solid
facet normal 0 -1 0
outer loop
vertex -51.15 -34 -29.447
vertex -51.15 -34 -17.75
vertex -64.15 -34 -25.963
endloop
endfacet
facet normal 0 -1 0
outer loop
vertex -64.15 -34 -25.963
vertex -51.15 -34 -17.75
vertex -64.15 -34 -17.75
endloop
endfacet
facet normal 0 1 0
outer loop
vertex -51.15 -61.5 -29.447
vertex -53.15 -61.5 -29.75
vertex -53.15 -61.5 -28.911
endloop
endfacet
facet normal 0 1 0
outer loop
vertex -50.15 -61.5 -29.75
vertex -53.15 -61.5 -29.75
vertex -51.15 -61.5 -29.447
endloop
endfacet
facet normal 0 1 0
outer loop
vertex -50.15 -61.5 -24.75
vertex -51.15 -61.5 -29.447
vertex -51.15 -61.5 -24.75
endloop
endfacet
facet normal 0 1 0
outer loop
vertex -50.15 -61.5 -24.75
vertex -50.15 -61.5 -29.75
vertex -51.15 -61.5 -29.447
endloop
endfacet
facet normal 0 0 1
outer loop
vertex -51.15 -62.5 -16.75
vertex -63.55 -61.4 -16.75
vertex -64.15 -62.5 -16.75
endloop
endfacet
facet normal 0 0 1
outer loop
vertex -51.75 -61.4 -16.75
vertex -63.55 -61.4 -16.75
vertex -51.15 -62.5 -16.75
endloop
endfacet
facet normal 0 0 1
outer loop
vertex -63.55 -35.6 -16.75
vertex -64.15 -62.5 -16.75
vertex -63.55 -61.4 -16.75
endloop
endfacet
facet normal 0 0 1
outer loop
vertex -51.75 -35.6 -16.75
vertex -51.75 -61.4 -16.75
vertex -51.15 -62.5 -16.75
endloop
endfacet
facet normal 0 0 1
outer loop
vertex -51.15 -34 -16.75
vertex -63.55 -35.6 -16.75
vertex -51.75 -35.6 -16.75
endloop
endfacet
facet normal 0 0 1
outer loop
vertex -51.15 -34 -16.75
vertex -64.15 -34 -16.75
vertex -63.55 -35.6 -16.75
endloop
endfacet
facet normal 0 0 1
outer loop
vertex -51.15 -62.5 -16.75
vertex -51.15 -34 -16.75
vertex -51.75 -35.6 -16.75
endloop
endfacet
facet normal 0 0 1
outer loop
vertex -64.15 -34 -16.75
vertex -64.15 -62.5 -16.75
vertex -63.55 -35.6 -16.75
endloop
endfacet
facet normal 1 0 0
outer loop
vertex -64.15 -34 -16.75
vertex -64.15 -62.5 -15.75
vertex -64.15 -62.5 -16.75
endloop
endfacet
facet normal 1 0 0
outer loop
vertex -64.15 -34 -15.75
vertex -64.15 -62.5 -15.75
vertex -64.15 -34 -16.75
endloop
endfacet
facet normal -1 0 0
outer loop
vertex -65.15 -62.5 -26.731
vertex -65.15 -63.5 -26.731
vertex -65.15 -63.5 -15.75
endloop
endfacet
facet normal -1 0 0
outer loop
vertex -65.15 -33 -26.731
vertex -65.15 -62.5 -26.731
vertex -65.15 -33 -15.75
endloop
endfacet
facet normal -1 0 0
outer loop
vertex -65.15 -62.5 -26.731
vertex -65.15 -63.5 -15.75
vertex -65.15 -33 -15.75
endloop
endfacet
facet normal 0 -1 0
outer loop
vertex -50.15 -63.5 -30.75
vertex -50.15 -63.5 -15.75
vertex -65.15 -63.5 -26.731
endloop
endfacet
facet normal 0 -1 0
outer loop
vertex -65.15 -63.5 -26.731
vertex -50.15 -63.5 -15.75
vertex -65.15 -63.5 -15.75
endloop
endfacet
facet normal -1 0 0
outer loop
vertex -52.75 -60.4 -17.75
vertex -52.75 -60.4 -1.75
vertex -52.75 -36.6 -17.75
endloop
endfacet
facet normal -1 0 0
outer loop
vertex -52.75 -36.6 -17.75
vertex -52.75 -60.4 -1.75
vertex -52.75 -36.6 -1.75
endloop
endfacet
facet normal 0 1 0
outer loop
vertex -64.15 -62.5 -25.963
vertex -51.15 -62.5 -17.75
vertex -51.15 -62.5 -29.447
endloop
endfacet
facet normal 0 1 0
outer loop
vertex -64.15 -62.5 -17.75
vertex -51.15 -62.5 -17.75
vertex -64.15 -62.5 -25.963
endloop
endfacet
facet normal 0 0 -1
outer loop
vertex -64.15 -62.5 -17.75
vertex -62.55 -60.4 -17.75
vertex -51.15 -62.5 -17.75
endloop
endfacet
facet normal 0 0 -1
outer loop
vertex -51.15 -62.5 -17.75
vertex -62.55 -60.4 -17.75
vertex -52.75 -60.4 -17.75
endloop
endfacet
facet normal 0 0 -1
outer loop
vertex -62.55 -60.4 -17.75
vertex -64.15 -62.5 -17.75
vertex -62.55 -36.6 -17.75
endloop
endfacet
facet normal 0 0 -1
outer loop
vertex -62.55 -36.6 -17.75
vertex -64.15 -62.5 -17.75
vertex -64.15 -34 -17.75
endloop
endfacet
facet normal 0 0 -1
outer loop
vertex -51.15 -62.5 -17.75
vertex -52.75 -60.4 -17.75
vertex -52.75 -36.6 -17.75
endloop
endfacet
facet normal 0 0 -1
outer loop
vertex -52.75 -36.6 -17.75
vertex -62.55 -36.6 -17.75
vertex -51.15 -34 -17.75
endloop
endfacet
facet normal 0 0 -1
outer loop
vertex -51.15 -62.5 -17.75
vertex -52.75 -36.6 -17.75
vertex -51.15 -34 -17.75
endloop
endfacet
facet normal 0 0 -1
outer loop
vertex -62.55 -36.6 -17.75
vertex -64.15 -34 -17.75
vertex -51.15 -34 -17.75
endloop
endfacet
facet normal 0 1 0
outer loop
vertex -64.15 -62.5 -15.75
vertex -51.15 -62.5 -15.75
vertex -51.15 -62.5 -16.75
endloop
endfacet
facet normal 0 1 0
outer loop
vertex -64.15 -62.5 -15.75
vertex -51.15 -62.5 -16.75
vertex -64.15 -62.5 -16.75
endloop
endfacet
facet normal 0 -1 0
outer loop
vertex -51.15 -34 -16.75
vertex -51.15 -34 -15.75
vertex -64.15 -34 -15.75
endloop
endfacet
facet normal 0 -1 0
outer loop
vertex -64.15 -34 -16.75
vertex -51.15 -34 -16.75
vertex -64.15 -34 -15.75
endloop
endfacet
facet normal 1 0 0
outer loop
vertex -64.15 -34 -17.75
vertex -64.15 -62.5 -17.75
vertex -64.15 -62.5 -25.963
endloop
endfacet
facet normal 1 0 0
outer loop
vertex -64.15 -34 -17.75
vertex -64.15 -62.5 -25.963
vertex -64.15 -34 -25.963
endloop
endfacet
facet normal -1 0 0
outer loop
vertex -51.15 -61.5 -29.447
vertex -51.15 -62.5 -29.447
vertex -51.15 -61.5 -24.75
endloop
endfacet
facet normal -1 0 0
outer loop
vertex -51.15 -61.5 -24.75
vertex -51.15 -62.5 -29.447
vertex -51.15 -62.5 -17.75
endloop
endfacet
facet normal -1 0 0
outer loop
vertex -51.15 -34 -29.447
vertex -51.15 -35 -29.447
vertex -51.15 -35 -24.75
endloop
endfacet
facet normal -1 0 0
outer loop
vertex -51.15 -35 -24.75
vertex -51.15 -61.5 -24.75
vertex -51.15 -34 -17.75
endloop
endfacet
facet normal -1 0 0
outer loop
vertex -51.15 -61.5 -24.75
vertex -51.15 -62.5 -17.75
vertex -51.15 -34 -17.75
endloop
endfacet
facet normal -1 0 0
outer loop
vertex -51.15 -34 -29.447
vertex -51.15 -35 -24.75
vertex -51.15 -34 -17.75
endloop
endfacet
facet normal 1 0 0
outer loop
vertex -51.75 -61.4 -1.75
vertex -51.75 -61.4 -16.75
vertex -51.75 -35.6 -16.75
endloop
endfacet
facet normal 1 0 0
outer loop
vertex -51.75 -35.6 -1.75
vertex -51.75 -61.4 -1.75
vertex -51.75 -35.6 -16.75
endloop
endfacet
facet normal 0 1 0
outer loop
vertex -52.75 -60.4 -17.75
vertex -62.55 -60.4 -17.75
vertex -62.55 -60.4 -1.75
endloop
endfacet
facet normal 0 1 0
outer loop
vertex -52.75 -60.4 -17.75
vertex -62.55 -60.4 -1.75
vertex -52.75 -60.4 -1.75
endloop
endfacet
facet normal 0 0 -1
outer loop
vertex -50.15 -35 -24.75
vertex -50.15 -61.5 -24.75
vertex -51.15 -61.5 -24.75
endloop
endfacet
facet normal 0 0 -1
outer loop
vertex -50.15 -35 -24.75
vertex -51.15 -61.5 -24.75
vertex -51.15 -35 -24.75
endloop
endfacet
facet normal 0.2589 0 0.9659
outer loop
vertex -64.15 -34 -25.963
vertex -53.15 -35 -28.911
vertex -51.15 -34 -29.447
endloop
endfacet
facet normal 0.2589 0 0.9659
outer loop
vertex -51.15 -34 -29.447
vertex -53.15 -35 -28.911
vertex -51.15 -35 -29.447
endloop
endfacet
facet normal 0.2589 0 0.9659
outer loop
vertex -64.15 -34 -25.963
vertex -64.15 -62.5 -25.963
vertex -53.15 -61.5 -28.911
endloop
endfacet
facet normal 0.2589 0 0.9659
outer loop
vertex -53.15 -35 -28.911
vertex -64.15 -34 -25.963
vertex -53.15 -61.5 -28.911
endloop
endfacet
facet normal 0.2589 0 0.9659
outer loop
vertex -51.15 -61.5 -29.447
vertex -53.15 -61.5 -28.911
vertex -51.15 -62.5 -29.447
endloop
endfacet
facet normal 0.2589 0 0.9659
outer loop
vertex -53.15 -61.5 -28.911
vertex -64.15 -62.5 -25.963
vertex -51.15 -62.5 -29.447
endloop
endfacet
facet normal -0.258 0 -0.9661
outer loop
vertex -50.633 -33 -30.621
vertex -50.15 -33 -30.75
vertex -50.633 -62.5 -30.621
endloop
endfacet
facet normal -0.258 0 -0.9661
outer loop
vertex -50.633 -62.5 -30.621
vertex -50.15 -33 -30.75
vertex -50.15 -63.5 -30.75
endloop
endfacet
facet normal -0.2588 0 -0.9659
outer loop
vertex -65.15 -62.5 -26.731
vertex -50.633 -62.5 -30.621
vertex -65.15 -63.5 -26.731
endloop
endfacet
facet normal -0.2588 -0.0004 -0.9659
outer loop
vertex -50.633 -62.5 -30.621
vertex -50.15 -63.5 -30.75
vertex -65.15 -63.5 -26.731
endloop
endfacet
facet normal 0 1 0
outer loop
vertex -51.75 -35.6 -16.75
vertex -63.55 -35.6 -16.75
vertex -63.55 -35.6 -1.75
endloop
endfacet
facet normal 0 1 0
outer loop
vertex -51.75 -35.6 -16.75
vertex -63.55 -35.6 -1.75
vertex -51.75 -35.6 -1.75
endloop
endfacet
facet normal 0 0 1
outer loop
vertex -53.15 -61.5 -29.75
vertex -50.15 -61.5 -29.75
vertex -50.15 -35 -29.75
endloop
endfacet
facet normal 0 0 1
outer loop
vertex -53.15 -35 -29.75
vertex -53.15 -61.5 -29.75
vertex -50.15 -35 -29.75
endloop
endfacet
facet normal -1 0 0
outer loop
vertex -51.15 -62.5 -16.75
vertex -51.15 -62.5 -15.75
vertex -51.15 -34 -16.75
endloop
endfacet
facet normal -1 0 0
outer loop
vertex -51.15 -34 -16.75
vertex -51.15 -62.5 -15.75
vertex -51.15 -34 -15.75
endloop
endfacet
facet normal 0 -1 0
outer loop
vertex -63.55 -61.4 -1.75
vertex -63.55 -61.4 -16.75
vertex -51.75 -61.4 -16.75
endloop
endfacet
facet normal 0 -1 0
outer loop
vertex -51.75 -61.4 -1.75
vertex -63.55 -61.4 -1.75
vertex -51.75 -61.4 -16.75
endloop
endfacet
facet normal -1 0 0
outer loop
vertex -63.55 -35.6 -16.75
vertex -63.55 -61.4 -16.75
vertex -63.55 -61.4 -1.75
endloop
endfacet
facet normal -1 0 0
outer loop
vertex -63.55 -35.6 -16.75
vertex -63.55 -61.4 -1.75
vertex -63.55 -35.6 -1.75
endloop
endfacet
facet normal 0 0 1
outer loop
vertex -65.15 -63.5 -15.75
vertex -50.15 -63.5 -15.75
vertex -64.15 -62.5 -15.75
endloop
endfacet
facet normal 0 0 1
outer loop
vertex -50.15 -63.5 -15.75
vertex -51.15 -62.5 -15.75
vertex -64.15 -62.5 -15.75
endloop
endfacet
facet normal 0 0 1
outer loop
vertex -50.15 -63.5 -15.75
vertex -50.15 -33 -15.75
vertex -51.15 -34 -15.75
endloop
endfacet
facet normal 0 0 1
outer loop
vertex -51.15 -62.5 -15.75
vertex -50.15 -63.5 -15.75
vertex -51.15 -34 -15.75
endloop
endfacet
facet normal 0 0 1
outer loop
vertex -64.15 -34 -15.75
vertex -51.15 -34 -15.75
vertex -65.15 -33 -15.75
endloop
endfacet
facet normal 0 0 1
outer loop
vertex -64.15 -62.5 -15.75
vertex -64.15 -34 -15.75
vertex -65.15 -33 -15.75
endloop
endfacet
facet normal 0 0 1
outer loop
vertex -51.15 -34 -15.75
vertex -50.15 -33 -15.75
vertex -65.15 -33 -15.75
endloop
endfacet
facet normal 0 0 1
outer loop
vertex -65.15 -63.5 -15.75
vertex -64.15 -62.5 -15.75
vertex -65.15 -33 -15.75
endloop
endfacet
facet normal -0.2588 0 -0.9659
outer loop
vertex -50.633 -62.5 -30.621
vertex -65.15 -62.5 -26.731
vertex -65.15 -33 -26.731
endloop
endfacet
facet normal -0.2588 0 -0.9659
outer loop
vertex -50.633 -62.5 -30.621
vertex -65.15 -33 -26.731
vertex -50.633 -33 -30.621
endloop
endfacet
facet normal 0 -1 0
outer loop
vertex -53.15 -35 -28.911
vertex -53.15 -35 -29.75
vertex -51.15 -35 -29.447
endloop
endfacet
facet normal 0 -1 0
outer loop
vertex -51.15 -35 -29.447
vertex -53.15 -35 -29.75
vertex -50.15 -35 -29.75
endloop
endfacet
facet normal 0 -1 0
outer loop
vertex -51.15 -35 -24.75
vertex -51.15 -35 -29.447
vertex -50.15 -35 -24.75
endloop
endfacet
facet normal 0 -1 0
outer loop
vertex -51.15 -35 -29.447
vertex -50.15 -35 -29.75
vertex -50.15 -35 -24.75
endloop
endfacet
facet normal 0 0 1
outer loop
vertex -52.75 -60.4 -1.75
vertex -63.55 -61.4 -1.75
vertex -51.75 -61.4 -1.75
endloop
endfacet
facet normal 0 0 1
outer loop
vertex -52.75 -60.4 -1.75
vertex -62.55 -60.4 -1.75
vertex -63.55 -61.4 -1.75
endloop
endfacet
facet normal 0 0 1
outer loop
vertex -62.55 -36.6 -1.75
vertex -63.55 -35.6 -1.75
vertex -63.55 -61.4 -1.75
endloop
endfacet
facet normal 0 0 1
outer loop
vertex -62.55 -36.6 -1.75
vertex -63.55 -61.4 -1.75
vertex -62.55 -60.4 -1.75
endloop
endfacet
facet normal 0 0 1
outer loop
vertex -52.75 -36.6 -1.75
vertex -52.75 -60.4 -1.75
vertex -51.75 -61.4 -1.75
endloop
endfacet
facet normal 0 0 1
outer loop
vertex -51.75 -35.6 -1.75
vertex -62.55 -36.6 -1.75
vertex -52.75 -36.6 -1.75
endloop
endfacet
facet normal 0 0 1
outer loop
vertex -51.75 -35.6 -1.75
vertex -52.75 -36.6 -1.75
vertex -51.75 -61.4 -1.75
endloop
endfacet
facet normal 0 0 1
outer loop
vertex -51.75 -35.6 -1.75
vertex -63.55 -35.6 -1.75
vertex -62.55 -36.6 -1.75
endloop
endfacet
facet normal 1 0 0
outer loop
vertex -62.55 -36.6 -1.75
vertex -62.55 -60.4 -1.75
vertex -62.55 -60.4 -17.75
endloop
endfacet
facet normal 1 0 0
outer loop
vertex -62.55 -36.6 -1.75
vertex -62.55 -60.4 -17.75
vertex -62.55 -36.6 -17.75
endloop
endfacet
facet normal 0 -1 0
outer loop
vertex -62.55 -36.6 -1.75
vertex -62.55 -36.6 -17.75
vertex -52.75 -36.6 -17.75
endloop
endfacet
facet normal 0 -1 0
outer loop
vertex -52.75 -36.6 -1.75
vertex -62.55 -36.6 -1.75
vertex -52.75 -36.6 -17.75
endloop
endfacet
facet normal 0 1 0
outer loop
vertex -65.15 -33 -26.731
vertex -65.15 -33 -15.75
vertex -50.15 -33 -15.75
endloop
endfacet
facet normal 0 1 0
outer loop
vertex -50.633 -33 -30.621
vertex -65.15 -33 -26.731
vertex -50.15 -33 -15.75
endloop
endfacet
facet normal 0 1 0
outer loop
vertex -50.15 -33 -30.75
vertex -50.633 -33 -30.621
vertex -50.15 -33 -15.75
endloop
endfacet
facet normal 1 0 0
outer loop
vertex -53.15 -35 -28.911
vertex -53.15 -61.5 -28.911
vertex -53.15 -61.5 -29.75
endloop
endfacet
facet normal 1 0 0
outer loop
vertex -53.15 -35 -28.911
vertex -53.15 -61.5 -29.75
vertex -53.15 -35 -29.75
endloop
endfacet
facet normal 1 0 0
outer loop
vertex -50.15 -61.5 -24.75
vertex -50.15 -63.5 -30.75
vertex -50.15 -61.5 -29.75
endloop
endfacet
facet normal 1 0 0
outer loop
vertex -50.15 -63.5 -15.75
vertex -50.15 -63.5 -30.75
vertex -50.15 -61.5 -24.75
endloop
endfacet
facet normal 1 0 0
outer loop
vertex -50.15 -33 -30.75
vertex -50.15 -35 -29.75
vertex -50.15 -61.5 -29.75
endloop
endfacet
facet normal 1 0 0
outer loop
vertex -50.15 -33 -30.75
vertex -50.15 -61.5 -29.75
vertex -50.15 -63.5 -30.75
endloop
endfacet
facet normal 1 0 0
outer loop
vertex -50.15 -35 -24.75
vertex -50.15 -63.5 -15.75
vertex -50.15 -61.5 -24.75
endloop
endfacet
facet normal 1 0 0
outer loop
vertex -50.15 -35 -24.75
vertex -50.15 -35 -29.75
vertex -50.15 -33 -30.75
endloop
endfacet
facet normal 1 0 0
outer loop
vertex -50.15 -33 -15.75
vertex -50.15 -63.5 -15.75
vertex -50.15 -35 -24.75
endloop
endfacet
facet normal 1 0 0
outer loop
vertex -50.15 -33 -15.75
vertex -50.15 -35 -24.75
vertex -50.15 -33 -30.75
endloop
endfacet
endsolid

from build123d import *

# Parameters (mm, degrees)
SKETCH061_W        = 11.8
SKETCH061_H        = 25.8
SKETCH061_W_2      = 9.8
SKETCH061_H_2      = 23.8
PAD031_DEPTH       = 15
SKETCH062_W        = 15
SKETCH062_H        = 30.5
SKETCH062_W_2      = 9.8
SKETCH062_H_2      = 23.8
PAD032_DEPTH       = 1
SKETCH063_W        = 15
SKETCH063_H        = 30.5
SKETCH063_W_2      = 13
SKETCH063_H_2      = 28.5
PAD033_DEPTH       = 15
POCKET007016_DEPTH = 30.501
SKETCH065_W        = 15.029142
SKETCH065_H        = 29.5
PAD034_DEPTH       = 1
SKETCH066_W        = 26.5
SKETCH066_H        = 5
POCKET007017_DEPTH = 3


with BuildPart() as part:
    # Sketch061 → Pad031 (new body)
    with BuildSketch(Plane.XY):
        with Locations((-57.65, -16.5)):
            Rectangle(SKETCH061_W, SKETCH061_H)
        with Locations((-57.65, -16.5)):
            Rectangle(SKETCH061_W_2, SKETCH061_H_2, mode=Mode.SUBTRACT)
    extrude(amount=PAD031_DEPTH)

    # Sketch062 → Pad032 (join)
    with BuildSketch(Plane.XY):
        with Locations((-57.65, -16.25)):
            Rectangle(SKETCH062_W, SKETCH062_H)
        with Locations((-57.65, -16.5)):
            Rectangle(SKETCH062_W_2, SKETCH062_H_2, mode=Mode.SUBTRACT)
    extrude(amount=-PAD032_DEPTH)

    # Sketch063 (on DatumPlane) → Pad033 (join)
    with BuildSketch(Plane(origin=(0, 0, 1), x_dir=(-1, 0, 0), z_dir=(0, 0, -1))):
        with Locations((57.65, -16.25)):
            Rectangle(SKETCH063_W, SKETCH063_H)
        with Locations((57.65, -16.25)):
            Rectangle(SKETCH063_W_2, SKETCH063_H_2, mode=Mode.SUBTRACT)
    extrude(amount=PAD033_DEPTH)

    # Sketch064 (on DatumPlane) → Pocket007016 (cut, through all)
    with BuildSketch(Plane(origin=(-65.15, -31.5, 1), x_dir=(1, 0, 0), z_dir=(0, -1, 0))):
        Polygon((15, -15), (0, -10.980762), (0, -15), align=None)
    extrude(amount=-POCKET007016_DEPTH, mode=Mode.SUBTRACT)

    # Sketch065 (on Face37 of Pocket007016) → Pad034 (join)
    with BuildSketch(Plane(origin=(-6.859413, 0, -25.599678), x_dir=(0.965926, 0, -0.258819), z_dir=(-0.258819, 0, -0.965926))):
        with Locations((-52.832285, 15.75)):
            Rectangle(SKETCH065_W, SKETCH065_H)
    extrude(amount=-PAD034_DEPTH)

    # Sketch066 (on Face36 of Pad034) → Pocket007017 (cut)
    with BuildSketch(Plane.YZ.offset(-50.15)):
        with Locations((-16.25, -10.5)):
            Rectangle(SKETCH066_W, SKETCH066_H)
    extrude(amount=-POCKET007017_DEPTH, mode=Mode.SUBTRACT)


with BuildPart() as part_1:
    # Body004 placement: moved
    add(part.part.moved(Location((0, -32, -16.75))))


solid = part_1.part
